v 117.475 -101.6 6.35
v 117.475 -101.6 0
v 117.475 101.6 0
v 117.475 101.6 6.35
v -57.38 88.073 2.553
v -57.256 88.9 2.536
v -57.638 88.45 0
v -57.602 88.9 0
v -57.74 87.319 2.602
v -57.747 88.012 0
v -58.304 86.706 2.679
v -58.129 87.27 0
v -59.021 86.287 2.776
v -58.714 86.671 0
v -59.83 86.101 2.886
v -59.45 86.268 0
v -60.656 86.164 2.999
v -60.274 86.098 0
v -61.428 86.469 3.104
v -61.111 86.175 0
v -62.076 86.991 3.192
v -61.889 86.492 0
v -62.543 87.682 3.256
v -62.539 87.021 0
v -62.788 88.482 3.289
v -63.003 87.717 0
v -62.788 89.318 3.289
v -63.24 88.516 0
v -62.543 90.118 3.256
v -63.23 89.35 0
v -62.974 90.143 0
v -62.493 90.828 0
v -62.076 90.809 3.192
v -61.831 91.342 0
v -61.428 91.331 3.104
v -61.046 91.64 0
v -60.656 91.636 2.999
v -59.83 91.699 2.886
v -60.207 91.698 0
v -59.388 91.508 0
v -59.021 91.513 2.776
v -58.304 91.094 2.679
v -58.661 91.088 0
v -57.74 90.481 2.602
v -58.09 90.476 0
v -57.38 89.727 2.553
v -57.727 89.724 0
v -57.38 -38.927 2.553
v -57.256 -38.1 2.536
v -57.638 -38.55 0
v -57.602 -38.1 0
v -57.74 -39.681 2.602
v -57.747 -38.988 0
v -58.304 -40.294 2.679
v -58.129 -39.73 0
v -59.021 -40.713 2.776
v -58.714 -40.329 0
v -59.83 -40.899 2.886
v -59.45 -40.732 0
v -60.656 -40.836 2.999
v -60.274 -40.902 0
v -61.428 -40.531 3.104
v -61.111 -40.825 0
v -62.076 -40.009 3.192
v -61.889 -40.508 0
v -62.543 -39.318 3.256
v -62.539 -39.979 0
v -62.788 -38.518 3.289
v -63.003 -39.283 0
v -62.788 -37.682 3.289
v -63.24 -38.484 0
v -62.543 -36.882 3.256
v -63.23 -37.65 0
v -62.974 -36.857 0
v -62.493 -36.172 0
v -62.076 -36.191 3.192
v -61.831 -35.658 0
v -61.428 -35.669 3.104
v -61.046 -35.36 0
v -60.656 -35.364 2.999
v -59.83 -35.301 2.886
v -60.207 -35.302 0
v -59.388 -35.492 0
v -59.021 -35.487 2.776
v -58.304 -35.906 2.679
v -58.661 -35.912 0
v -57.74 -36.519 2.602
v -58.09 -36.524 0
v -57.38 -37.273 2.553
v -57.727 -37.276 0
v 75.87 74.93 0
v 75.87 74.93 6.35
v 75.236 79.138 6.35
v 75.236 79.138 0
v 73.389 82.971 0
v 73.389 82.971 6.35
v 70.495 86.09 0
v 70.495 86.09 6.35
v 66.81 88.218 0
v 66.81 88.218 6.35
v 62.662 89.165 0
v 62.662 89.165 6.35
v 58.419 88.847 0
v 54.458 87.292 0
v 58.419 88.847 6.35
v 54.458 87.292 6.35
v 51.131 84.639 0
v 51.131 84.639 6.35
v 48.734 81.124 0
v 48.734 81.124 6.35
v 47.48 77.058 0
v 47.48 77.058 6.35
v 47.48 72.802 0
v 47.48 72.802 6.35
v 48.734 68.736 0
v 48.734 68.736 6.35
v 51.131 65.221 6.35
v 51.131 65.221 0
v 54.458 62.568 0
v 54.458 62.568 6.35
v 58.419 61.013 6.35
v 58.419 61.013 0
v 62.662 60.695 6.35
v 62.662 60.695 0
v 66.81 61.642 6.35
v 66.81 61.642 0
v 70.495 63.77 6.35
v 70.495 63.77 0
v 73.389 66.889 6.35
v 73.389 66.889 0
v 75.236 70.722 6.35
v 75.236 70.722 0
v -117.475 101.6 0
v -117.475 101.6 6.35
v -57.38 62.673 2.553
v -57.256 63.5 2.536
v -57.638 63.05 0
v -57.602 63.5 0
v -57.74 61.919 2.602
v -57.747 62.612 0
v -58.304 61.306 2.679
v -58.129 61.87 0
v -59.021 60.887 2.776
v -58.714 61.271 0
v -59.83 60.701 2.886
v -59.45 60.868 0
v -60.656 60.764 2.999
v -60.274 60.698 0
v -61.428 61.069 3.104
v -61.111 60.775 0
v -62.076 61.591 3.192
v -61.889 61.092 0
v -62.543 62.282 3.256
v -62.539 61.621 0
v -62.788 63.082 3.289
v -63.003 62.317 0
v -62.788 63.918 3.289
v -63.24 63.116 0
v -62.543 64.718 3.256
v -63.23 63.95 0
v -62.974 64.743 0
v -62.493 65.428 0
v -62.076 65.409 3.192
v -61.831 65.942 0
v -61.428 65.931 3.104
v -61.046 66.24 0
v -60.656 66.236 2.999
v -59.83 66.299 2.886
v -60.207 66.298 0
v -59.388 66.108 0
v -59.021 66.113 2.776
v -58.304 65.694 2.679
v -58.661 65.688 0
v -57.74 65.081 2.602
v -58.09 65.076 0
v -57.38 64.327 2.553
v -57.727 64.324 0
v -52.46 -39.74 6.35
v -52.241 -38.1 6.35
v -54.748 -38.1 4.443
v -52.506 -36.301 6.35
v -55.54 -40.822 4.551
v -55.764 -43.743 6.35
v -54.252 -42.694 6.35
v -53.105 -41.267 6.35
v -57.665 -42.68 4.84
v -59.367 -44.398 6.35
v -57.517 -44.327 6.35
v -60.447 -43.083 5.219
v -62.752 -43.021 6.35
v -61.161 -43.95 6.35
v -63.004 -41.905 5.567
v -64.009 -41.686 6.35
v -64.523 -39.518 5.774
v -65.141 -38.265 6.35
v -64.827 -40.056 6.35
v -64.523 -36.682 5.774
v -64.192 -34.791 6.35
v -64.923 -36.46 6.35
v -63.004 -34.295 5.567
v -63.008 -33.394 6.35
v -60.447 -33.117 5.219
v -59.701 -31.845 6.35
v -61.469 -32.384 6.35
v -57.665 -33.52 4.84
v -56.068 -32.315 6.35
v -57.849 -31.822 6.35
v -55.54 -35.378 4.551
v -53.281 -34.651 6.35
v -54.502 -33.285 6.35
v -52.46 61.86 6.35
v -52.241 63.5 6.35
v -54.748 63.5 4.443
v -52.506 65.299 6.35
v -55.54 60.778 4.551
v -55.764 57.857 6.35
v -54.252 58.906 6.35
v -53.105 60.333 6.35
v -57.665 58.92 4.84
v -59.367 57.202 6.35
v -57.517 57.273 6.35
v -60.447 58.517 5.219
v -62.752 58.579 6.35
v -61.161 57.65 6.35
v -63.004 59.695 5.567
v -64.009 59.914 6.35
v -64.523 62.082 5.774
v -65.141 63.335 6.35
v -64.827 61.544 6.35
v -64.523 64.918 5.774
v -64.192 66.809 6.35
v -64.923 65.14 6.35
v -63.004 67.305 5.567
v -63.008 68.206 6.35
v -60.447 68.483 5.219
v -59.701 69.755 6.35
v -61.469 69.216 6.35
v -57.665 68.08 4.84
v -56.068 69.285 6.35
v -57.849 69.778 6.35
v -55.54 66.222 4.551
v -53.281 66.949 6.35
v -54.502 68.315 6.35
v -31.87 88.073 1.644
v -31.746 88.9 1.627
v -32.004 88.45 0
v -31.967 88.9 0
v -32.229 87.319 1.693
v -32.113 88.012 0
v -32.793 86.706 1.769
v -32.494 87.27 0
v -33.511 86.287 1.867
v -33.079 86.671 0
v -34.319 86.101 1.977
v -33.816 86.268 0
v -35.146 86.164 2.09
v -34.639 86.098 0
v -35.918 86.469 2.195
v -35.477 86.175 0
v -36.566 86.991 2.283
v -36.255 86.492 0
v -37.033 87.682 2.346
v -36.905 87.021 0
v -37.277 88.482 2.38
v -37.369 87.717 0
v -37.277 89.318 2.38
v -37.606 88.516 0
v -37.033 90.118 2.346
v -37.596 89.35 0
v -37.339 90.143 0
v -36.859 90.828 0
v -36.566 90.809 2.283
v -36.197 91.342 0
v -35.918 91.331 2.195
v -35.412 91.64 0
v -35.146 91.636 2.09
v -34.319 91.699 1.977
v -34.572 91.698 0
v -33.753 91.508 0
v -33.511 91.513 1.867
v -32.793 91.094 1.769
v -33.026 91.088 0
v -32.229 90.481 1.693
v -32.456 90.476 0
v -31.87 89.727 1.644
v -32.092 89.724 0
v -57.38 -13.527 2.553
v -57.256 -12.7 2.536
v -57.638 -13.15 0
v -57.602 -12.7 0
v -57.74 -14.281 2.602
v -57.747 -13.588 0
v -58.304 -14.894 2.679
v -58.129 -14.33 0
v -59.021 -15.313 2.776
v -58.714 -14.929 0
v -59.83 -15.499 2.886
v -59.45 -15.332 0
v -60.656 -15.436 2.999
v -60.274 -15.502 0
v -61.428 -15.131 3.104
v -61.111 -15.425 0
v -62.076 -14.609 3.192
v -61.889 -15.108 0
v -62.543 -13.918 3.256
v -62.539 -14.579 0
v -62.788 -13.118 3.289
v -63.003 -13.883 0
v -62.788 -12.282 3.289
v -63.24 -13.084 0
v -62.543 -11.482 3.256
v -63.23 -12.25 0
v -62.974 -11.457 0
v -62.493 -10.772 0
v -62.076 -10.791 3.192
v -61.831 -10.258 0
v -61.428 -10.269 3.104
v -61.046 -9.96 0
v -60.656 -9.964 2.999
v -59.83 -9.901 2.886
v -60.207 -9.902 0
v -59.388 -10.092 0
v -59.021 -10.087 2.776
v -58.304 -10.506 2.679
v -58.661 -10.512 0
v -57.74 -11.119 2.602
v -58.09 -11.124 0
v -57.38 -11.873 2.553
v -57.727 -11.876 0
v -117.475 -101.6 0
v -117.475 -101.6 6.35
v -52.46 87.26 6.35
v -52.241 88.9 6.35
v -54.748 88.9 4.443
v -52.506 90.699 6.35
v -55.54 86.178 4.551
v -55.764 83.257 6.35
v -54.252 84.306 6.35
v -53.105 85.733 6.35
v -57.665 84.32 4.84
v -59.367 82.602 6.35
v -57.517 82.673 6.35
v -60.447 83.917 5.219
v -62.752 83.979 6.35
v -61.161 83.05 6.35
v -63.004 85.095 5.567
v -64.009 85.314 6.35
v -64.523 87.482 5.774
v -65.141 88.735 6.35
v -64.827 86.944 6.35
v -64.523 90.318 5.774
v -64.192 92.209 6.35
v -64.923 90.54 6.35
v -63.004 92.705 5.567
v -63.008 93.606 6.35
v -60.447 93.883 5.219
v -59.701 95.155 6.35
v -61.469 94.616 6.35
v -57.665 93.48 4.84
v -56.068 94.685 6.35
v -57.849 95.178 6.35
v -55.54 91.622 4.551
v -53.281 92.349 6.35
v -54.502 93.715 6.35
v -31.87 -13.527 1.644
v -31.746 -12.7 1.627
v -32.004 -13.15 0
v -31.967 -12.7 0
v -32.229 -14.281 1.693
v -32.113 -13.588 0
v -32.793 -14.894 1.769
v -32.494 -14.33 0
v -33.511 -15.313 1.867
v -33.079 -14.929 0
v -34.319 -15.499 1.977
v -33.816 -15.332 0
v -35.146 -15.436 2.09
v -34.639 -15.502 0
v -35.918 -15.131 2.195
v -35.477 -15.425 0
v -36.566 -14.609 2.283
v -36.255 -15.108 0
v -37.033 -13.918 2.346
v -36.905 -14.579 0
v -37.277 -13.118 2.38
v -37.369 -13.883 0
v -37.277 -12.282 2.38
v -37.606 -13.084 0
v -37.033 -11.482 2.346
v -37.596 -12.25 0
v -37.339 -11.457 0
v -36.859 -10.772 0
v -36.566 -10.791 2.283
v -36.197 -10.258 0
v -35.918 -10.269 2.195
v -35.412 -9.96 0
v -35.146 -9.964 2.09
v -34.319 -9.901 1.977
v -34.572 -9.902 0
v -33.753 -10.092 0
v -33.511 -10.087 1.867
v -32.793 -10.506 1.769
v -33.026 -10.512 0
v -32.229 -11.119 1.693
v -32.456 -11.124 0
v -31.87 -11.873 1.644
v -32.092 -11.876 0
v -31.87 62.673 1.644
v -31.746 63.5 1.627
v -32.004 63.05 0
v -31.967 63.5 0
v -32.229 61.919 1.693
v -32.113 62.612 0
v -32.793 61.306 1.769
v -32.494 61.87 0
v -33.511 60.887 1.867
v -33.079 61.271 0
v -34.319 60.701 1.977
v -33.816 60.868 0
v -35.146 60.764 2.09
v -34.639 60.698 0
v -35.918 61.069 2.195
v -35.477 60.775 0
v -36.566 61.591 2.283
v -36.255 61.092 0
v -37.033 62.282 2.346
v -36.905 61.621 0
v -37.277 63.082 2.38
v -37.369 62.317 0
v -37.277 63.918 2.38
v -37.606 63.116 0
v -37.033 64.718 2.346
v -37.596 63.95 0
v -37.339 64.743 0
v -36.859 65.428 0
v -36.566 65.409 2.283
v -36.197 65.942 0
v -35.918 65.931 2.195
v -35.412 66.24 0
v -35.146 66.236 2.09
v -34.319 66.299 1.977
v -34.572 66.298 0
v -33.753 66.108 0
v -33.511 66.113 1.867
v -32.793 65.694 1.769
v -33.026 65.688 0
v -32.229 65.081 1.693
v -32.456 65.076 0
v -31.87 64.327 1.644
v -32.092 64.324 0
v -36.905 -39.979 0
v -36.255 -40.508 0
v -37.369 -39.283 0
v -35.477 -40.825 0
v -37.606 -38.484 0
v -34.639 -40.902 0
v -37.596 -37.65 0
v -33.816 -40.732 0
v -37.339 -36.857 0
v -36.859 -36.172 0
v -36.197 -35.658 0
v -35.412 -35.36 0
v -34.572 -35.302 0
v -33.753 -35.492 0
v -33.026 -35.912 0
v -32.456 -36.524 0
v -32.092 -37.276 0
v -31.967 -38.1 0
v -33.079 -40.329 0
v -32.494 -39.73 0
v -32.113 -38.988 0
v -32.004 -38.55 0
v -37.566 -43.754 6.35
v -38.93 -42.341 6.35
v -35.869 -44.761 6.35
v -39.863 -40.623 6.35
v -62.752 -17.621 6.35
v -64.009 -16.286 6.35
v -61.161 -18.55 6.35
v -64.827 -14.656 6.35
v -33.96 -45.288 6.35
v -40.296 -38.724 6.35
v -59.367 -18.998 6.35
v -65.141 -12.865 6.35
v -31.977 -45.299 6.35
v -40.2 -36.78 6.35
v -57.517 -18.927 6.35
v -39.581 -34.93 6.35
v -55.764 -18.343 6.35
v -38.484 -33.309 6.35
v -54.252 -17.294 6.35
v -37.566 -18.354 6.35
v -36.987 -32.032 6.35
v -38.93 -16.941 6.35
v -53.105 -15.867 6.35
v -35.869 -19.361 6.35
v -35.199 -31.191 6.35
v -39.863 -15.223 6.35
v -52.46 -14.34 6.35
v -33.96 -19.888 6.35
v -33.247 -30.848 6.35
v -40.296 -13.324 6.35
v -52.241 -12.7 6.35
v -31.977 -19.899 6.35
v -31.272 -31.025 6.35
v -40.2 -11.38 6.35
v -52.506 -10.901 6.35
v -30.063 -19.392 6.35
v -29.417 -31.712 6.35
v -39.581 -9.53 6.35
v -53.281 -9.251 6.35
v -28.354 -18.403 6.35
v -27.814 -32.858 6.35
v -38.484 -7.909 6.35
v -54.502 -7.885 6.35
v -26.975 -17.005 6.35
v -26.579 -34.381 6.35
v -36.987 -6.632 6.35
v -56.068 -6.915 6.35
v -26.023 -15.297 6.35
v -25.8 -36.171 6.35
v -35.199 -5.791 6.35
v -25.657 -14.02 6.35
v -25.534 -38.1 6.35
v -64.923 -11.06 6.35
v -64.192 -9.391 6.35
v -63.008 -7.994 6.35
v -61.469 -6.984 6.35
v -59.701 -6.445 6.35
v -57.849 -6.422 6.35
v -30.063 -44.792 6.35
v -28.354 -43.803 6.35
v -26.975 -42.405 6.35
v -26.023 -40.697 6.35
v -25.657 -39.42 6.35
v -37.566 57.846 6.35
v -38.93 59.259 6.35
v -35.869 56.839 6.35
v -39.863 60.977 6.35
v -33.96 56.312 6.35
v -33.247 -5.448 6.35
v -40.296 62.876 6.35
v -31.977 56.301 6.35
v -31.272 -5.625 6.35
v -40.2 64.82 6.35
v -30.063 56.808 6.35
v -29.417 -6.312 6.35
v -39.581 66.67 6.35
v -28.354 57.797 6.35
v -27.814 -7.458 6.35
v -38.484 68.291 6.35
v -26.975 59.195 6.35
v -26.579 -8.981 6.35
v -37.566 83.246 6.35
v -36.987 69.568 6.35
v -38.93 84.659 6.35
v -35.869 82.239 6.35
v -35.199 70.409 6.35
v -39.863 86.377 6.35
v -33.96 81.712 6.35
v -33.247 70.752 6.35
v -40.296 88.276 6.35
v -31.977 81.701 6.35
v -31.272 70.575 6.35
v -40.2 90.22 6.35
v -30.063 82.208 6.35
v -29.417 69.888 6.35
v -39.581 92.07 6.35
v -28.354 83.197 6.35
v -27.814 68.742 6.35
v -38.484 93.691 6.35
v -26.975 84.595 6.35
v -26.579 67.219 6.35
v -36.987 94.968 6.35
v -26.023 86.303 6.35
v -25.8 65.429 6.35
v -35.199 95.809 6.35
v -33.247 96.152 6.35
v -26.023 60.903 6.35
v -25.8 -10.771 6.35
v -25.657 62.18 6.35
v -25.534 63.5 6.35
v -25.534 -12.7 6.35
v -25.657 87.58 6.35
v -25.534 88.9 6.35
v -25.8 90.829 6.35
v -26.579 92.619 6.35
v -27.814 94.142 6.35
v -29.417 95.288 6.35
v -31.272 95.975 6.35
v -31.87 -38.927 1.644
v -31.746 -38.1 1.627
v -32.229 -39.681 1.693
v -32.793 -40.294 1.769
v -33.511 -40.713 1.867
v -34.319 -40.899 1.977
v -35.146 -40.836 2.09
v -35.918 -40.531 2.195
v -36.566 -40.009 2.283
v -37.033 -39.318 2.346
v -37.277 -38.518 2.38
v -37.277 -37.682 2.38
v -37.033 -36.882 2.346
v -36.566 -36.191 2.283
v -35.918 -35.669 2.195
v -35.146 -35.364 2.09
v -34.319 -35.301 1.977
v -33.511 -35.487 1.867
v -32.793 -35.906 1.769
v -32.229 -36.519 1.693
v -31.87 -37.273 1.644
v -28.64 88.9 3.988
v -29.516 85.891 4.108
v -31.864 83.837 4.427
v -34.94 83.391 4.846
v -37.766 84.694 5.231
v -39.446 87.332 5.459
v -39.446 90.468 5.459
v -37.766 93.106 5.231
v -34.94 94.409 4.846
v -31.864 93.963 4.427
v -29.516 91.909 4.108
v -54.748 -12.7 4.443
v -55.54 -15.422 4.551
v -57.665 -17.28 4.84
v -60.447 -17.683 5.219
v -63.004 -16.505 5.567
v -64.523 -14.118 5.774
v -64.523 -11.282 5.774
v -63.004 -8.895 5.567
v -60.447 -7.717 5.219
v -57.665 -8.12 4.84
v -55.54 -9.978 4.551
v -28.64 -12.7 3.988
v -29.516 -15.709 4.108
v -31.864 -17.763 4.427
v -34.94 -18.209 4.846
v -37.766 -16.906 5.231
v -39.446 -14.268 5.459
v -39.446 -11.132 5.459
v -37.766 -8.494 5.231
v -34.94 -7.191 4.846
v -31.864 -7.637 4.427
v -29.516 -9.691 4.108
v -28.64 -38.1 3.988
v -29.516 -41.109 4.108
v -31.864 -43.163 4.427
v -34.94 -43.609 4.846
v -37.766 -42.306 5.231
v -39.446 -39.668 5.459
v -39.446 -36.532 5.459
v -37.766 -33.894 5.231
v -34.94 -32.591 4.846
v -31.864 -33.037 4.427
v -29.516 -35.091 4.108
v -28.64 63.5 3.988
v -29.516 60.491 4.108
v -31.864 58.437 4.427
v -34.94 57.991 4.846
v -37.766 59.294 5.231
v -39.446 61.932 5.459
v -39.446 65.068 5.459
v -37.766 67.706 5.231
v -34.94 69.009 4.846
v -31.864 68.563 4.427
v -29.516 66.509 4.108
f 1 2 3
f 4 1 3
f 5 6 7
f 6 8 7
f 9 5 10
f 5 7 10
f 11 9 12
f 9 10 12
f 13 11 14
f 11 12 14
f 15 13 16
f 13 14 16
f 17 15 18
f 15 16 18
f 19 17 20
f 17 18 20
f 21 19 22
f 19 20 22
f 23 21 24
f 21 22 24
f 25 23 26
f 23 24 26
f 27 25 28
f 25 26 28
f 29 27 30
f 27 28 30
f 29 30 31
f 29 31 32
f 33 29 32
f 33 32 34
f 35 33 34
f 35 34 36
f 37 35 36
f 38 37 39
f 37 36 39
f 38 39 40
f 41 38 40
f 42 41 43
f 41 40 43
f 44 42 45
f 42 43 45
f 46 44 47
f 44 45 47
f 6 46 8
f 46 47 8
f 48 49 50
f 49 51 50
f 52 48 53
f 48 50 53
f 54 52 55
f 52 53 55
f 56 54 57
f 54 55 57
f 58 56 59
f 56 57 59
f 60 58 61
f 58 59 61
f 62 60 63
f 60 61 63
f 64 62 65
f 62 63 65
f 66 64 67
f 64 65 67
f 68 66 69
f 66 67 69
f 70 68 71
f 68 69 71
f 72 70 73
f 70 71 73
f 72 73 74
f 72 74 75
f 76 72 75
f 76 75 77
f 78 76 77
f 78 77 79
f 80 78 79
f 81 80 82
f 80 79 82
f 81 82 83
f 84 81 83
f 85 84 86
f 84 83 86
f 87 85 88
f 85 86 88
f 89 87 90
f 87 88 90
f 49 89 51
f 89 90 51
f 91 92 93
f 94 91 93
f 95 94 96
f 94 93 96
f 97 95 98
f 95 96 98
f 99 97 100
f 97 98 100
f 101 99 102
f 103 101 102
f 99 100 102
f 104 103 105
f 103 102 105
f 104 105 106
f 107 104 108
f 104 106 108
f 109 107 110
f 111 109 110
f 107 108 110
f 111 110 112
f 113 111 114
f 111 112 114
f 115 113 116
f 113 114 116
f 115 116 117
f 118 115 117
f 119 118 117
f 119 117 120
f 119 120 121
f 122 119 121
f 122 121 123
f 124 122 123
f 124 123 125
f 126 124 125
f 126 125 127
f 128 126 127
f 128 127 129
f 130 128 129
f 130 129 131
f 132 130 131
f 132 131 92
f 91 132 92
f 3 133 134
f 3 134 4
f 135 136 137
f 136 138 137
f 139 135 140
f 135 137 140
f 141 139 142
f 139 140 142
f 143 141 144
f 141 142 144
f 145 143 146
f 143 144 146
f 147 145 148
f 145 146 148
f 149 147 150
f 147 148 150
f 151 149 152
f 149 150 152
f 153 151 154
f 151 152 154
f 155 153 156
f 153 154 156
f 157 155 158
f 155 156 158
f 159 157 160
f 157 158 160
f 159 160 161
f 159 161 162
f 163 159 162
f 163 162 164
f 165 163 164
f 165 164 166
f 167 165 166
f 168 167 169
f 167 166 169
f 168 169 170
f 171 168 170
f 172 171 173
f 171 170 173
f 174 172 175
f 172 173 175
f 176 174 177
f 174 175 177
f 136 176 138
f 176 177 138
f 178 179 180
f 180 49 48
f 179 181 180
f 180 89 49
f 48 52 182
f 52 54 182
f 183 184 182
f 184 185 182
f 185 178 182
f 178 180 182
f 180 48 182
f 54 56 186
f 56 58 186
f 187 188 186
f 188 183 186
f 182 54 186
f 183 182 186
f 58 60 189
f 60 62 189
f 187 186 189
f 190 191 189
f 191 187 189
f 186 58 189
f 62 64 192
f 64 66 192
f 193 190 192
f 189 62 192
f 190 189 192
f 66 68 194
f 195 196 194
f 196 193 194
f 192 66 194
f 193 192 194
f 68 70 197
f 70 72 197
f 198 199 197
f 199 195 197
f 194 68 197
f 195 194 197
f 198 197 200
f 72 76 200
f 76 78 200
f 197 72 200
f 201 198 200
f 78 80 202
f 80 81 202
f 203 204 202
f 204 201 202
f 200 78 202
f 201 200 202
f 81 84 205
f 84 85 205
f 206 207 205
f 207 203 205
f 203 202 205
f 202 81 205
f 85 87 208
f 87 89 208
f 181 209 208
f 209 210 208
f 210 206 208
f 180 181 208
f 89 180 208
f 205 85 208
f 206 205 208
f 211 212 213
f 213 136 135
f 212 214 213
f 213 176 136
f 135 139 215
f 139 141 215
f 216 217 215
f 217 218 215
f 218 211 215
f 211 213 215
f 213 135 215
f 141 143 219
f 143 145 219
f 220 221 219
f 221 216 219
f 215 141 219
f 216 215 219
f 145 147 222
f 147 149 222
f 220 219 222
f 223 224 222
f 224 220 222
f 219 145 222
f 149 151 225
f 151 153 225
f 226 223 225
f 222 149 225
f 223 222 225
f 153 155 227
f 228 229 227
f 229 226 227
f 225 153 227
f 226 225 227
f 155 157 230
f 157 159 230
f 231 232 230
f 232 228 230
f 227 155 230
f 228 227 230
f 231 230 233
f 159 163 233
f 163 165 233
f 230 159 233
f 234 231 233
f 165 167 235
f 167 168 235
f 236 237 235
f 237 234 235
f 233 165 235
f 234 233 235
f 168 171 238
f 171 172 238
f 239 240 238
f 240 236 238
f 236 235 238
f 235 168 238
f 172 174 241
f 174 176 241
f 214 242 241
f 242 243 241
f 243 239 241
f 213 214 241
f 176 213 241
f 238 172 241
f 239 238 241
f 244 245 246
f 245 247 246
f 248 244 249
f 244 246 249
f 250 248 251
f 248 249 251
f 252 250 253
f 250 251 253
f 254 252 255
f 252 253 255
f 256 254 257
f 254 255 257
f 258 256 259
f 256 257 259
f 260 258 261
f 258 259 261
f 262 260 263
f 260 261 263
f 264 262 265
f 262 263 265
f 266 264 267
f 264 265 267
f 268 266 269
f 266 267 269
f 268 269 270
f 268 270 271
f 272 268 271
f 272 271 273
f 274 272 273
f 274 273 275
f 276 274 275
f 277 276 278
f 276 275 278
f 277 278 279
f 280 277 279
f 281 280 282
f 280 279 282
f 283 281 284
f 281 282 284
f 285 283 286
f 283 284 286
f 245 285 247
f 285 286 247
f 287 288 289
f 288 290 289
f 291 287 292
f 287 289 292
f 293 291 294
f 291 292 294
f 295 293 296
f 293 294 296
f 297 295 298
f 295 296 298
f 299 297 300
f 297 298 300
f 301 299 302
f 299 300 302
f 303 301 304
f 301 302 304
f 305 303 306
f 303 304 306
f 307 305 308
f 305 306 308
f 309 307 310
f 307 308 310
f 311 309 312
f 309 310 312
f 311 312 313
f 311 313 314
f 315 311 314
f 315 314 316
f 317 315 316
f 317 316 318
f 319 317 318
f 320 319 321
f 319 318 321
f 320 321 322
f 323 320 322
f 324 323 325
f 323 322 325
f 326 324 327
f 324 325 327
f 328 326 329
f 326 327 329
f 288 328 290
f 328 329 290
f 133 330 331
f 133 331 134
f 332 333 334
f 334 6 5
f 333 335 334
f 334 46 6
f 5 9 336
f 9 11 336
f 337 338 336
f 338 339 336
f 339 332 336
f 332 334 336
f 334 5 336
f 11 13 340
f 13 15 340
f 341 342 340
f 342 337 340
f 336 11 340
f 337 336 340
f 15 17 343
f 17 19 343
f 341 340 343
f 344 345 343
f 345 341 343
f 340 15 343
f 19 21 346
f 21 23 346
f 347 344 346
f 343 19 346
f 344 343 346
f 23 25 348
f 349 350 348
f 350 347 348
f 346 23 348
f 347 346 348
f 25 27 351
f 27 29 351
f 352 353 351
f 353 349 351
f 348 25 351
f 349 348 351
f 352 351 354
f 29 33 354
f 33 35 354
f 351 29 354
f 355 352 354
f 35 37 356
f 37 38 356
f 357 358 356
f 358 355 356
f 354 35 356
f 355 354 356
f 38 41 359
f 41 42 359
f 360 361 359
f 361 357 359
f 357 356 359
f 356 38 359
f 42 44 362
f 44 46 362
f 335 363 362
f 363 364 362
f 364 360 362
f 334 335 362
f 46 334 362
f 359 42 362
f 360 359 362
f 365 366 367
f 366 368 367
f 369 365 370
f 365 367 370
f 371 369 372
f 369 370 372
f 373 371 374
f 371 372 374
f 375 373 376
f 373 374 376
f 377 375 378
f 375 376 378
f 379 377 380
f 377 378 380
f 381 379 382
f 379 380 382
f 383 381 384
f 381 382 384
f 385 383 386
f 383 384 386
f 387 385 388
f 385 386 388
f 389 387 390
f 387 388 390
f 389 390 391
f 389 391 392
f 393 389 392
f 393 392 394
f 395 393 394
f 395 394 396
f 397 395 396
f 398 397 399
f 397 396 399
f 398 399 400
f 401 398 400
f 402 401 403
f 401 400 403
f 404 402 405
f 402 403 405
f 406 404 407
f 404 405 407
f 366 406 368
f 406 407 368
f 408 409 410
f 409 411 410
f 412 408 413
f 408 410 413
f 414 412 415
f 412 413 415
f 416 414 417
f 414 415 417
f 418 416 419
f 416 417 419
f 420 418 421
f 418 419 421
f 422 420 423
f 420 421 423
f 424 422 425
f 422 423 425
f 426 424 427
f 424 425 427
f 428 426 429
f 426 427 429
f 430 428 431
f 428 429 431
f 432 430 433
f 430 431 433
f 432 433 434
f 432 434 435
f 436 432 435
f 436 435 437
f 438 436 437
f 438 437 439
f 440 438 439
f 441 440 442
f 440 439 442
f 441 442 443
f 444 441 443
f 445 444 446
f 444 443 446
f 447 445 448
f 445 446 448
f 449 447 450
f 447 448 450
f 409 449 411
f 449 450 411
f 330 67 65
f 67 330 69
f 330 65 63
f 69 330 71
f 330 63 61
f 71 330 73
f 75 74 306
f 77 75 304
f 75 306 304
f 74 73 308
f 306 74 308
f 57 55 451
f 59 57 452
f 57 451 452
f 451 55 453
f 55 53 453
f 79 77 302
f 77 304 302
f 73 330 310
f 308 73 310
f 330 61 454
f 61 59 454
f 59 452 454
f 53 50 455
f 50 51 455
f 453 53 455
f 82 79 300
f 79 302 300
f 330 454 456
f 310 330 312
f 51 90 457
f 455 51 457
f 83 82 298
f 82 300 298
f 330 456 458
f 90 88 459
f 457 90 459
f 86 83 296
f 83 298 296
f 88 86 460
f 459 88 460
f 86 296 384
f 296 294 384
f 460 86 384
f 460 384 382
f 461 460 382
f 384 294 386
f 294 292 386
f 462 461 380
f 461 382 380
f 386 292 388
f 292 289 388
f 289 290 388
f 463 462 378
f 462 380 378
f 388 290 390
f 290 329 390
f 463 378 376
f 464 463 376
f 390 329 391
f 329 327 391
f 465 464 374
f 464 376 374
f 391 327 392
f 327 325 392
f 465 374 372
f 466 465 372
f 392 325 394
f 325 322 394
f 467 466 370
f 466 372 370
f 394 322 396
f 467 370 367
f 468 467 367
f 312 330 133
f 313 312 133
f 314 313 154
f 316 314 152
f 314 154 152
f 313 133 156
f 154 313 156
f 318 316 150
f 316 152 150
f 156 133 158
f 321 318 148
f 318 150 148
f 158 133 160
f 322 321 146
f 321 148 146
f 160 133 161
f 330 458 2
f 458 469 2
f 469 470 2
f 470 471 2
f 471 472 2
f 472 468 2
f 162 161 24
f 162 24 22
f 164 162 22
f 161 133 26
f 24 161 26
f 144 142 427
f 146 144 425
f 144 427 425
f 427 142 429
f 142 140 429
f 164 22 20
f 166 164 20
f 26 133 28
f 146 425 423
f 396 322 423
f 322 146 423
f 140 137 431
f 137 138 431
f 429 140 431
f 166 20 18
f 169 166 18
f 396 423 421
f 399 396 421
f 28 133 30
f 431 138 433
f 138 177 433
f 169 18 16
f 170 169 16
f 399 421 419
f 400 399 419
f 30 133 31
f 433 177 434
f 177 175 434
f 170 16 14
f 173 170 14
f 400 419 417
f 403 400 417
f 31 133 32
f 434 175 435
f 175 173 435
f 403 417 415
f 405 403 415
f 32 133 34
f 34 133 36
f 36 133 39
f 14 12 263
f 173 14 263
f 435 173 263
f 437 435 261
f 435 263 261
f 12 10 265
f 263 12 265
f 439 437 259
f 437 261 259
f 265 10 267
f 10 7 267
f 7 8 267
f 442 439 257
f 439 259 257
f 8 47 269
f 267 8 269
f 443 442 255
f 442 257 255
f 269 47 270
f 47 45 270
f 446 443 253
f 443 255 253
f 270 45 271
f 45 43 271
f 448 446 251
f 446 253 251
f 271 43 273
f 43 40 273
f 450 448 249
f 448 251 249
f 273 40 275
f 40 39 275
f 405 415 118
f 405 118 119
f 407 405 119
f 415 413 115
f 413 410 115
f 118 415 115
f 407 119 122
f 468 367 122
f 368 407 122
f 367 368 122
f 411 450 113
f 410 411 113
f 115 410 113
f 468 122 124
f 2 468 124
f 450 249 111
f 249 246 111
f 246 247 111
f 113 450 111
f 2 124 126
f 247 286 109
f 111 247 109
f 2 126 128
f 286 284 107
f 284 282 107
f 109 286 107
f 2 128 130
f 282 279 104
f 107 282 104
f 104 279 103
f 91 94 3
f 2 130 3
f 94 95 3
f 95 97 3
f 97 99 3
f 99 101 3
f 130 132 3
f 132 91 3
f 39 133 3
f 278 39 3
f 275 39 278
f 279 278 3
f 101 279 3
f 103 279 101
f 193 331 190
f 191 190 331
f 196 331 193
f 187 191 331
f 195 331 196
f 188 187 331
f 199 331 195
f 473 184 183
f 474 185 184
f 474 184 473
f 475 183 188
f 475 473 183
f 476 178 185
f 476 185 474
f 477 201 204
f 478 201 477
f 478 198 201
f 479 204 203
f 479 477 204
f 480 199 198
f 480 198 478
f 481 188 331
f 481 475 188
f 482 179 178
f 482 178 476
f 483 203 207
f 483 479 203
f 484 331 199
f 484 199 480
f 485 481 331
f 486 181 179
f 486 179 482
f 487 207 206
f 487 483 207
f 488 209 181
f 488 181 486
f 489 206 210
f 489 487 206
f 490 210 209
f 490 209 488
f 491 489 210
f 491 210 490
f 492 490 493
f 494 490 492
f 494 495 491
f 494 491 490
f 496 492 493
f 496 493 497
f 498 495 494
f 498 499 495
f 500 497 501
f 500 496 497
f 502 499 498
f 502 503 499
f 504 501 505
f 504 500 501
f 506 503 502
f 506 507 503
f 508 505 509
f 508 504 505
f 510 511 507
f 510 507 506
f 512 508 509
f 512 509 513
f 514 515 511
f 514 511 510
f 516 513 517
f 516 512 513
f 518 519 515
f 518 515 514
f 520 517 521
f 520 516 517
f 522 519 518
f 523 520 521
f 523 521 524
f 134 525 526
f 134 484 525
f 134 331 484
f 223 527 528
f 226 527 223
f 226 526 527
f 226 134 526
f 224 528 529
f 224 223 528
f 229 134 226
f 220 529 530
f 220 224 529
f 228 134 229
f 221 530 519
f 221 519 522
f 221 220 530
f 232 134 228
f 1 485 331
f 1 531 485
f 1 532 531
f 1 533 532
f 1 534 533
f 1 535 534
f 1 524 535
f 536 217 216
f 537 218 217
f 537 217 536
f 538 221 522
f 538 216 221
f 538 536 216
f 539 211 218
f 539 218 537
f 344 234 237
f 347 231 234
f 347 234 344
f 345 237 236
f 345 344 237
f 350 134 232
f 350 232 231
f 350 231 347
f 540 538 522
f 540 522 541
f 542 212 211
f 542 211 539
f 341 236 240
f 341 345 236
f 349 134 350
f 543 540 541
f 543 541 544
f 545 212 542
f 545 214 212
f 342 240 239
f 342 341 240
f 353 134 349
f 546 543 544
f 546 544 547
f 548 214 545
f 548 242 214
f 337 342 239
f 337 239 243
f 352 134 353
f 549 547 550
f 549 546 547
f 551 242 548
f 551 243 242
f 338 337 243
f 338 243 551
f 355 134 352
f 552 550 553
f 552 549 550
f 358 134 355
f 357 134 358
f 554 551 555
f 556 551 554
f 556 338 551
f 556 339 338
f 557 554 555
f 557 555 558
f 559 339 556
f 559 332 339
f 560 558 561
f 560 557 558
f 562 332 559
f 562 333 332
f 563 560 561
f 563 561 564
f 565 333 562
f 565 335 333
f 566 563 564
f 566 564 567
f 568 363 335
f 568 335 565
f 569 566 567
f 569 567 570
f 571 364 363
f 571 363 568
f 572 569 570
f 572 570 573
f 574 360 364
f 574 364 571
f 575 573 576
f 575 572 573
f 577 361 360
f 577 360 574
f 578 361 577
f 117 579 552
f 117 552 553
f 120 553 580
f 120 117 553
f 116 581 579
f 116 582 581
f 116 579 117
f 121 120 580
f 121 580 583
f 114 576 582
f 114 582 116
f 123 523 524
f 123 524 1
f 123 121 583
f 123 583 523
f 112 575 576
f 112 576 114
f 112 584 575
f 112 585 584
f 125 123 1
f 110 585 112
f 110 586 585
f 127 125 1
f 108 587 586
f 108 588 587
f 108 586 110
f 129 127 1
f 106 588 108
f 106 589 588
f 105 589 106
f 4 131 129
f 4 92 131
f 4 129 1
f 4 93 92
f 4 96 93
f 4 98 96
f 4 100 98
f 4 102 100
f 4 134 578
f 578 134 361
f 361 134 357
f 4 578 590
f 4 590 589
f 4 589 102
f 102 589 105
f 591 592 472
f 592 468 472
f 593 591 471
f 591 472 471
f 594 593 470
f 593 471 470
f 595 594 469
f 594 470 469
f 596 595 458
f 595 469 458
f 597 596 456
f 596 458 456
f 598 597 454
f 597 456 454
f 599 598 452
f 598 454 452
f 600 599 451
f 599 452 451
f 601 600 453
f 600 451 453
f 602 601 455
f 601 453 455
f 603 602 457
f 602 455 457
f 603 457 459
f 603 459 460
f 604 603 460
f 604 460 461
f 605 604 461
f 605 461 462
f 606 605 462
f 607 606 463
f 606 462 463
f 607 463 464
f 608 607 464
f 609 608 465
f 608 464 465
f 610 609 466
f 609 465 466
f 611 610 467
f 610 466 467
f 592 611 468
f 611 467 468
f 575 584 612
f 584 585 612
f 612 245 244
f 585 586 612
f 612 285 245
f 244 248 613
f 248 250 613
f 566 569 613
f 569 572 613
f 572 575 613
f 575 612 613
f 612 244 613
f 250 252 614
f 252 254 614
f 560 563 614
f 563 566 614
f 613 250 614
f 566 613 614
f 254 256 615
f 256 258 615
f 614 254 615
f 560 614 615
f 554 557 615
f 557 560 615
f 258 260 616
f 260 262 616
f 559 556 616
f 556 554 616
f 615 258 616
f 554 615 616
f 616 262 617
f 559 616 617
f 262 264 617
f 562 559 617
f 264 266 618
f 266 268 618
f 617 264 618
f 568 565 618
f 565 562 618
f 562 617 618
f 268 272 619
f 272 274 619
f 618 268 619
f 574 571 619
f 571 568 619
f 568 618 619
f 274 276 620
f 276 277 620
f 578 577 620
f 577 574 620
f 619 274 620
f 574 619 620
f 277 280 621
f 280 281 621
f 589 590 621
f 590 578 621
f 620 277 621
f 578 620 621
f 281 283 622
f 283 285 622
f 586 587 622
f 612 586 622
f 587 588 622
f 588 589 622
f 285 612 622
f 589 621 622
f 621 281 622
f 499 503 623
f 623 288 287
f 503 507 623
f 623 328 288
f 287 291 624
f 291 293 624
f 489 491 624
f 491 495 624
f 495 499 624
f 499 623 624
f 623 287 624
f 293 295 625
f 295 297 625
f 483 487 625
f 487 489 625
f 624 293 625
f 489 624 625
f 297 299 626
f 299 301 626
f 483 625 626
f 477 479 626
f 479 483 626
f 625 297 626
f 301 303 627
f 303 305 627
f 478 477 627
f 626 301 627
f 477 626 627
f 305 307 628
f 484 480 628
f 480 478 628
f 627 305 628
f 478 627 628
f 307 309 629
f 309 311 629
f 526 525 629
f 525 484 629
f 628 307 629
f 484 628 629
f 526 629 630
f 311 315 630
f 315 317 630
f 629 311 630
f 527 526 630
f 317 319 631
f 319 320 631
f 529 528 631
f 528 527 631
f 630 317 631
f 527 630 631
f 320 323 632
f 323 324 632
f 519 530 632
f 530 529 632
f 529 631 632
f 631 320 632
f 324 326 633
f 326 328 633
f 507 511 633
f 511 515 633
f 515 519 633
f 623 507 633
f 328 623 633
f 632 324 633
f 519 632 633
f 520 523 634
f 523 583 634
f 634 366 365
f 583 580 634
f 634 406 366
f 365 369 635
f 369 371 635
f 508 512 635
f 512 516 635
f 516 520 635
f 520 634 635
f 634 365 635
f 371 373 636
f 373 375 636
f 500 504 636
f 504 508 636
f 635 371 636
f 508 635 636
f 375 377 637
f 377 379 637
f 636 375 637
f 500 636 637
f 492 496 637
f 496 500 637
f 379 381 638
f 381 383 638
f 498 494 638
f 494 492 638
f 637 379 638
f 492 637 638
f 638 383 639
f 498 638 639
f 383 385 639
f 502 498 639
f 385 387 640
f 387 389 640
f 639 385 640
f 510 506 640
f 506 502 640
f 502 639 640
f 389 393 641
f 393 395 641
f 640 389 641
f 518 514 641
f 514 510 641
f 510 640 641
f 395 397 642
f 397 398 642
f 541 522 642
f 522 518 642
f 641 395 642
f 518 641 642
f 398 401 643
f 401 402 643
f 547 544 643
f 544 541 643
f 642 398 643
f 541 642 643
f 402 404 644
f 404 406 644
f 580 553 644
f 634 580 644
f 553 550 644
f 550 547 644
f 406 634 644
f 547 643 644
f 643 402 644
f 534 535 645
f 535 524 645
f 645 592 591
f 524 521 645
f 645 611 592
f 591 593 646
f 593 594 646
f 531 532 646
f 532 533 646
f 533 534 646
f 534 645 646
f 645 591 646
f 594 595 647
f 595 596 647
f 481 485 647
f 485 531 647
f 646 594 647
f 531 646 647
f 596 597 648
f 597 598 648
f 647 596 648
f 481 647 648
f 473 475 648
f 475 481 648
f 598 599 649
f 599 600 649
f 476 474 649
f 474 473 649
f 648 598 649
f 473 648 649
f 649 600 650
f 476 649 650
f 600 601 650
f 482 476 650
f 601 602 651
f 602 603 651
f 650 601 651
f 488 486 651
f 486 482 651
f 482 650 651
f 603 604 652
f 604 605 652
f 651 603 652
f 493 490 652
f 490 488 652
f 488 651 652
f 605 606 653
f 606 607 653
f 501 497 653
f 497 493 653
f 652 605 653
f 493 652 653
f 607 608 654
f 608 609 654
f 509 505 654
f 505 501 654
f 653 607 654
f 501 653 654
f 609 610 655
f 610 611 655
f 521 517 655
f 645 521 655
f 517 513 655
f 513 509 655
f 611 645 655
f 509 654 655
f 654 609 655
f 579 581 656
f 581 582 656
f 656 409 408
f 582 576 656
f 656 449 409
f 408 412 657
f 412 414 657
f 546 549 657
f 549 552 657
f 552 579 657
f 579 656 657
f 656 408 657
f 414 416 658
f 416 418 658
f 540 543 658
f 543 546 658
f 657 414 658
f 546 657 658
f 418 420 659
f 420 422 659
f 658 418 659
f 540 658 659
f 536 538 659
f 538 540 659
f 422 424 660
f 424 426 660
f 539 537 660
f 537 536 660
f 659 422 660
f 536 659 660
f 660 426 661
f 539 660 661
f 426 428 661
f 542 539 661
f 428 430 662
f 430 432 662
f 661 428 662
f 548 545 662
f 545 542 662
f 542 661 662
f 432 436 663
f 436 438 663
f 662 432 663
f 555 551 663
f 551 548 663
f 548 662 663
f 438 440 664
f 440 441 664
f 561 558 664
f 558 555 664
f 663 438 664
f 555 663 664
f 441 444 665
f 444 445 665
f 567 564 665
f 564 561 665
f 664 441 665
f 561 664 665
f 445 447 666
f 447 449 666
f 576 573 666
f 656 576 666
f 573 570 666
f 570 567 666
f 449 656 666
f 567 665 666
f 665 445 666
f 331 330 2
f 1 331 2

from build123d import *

# Parameters (mm, degrees)
SKETCH1_W                                          = 234.95
SKETCH1_H                                          = 203.2
BOSS_EXTRUDE1_DEPTH                                = 6.35
SKETCH2_R                                          = 14.2748
CUT_EXTRUDE1_DEPTH                                 = 7.35
CSK_FOR_10_FLAT_HEAD_MACHINE_SCREW_100_D           = 5.6134
CSK_FOR_10_FLAT_HEAD_MACHINE_SCREW_100_CSINK_D     = 17.78
CSK_FOR_10_FLAT_HEAD_MACHINE_SCREW_100_CSINK_ANGLE = 90
CSK_FOR_10_FLAT_HEAD_MACHINE_SCREW_2_D             = 5.6134
CSK_FOR_10_FLAT_HEAD_MACHINE_SCREW_2_CSINK_D       = 17.78
CSK_FOR_10_FLAT_HEAD_MACHINE_SCREW_2_CSINK_ANGLE   = 90


with BuildPart() as part:
    # Sketch1 → Boss-Extrude1 (new body)
    with BuildSketch(Plane.XY):
        Rectangle(SKETCH1_W, SKETCH1_H)
    extrude(amount=BOSS_EXTRUDE1_DEPTH)

    # Sketch2 → Cut-Extrude1 (cut, through all)
    with BuildSketch(Plane.XY.offset(6.35)):
        with Locations((61.595, 74.93)):
            Circle(SKETCH2_R)
    extrude(amount=-CUT_EXTRUDE1_DEPTH, mode=Mode.SUBTRACT)

    # CSK for _10 Flat Head Machine Screw _100 (through all)
    with Locations(Plane(origin=(271.17770657, -265.595089466, -36.034392524), x_dir=(-0.990861087, 0, 0.134886274), z_dir=(0.134886274, 0, 0.990861087))):
        with Locations((333.441972913, -227.495089466), (333.441972913, -252.895089466), (333.441972913, -329.095089466), (333.441972913, -354.495089466)):
            CounterSinkHole(CSK_FOR_10_FLAT_HEAD_MACHINE_SCREW_100_D / 2, CSK_FOR_10_FLAT_HEAD_MACHINE_SCREW_100_CSINK_D / 2, counter_sink_angle=CSK_FOR_10_FLAT_HEAD_MACHINE_SCREW_100_CSINK_ANGLE)

    # CSK for _10 Flat Head Machine Screw  2 (through all)
    with Locations(Plane(origin=(271.520317707, -265.595089466, -33.517605364), x_dir=(-0.990861087, 0, 0.134886274), z_dir=(0.134886274, 0, 0.990861087))):
        with Locations((308.041972913, -252.895089466), (308.041972913, -227.495089466), (308.041972913, -329.095089466), (308.041972913, -354.495089466)):
            CounterSinkHole(CSK_FOR_10_FLAT_HEAD_MACHINE_SCREW_2_D / 2, CSK_FOR_10_FLAT_HEAD_MACHINE_SCREW_2_CSINK_D / 2, counter_sink_angle=CSK_FOR_10_FLAT_HEAD_MACHINE_SCREW_2_CSINK_ANGLE)


solid = part.part
